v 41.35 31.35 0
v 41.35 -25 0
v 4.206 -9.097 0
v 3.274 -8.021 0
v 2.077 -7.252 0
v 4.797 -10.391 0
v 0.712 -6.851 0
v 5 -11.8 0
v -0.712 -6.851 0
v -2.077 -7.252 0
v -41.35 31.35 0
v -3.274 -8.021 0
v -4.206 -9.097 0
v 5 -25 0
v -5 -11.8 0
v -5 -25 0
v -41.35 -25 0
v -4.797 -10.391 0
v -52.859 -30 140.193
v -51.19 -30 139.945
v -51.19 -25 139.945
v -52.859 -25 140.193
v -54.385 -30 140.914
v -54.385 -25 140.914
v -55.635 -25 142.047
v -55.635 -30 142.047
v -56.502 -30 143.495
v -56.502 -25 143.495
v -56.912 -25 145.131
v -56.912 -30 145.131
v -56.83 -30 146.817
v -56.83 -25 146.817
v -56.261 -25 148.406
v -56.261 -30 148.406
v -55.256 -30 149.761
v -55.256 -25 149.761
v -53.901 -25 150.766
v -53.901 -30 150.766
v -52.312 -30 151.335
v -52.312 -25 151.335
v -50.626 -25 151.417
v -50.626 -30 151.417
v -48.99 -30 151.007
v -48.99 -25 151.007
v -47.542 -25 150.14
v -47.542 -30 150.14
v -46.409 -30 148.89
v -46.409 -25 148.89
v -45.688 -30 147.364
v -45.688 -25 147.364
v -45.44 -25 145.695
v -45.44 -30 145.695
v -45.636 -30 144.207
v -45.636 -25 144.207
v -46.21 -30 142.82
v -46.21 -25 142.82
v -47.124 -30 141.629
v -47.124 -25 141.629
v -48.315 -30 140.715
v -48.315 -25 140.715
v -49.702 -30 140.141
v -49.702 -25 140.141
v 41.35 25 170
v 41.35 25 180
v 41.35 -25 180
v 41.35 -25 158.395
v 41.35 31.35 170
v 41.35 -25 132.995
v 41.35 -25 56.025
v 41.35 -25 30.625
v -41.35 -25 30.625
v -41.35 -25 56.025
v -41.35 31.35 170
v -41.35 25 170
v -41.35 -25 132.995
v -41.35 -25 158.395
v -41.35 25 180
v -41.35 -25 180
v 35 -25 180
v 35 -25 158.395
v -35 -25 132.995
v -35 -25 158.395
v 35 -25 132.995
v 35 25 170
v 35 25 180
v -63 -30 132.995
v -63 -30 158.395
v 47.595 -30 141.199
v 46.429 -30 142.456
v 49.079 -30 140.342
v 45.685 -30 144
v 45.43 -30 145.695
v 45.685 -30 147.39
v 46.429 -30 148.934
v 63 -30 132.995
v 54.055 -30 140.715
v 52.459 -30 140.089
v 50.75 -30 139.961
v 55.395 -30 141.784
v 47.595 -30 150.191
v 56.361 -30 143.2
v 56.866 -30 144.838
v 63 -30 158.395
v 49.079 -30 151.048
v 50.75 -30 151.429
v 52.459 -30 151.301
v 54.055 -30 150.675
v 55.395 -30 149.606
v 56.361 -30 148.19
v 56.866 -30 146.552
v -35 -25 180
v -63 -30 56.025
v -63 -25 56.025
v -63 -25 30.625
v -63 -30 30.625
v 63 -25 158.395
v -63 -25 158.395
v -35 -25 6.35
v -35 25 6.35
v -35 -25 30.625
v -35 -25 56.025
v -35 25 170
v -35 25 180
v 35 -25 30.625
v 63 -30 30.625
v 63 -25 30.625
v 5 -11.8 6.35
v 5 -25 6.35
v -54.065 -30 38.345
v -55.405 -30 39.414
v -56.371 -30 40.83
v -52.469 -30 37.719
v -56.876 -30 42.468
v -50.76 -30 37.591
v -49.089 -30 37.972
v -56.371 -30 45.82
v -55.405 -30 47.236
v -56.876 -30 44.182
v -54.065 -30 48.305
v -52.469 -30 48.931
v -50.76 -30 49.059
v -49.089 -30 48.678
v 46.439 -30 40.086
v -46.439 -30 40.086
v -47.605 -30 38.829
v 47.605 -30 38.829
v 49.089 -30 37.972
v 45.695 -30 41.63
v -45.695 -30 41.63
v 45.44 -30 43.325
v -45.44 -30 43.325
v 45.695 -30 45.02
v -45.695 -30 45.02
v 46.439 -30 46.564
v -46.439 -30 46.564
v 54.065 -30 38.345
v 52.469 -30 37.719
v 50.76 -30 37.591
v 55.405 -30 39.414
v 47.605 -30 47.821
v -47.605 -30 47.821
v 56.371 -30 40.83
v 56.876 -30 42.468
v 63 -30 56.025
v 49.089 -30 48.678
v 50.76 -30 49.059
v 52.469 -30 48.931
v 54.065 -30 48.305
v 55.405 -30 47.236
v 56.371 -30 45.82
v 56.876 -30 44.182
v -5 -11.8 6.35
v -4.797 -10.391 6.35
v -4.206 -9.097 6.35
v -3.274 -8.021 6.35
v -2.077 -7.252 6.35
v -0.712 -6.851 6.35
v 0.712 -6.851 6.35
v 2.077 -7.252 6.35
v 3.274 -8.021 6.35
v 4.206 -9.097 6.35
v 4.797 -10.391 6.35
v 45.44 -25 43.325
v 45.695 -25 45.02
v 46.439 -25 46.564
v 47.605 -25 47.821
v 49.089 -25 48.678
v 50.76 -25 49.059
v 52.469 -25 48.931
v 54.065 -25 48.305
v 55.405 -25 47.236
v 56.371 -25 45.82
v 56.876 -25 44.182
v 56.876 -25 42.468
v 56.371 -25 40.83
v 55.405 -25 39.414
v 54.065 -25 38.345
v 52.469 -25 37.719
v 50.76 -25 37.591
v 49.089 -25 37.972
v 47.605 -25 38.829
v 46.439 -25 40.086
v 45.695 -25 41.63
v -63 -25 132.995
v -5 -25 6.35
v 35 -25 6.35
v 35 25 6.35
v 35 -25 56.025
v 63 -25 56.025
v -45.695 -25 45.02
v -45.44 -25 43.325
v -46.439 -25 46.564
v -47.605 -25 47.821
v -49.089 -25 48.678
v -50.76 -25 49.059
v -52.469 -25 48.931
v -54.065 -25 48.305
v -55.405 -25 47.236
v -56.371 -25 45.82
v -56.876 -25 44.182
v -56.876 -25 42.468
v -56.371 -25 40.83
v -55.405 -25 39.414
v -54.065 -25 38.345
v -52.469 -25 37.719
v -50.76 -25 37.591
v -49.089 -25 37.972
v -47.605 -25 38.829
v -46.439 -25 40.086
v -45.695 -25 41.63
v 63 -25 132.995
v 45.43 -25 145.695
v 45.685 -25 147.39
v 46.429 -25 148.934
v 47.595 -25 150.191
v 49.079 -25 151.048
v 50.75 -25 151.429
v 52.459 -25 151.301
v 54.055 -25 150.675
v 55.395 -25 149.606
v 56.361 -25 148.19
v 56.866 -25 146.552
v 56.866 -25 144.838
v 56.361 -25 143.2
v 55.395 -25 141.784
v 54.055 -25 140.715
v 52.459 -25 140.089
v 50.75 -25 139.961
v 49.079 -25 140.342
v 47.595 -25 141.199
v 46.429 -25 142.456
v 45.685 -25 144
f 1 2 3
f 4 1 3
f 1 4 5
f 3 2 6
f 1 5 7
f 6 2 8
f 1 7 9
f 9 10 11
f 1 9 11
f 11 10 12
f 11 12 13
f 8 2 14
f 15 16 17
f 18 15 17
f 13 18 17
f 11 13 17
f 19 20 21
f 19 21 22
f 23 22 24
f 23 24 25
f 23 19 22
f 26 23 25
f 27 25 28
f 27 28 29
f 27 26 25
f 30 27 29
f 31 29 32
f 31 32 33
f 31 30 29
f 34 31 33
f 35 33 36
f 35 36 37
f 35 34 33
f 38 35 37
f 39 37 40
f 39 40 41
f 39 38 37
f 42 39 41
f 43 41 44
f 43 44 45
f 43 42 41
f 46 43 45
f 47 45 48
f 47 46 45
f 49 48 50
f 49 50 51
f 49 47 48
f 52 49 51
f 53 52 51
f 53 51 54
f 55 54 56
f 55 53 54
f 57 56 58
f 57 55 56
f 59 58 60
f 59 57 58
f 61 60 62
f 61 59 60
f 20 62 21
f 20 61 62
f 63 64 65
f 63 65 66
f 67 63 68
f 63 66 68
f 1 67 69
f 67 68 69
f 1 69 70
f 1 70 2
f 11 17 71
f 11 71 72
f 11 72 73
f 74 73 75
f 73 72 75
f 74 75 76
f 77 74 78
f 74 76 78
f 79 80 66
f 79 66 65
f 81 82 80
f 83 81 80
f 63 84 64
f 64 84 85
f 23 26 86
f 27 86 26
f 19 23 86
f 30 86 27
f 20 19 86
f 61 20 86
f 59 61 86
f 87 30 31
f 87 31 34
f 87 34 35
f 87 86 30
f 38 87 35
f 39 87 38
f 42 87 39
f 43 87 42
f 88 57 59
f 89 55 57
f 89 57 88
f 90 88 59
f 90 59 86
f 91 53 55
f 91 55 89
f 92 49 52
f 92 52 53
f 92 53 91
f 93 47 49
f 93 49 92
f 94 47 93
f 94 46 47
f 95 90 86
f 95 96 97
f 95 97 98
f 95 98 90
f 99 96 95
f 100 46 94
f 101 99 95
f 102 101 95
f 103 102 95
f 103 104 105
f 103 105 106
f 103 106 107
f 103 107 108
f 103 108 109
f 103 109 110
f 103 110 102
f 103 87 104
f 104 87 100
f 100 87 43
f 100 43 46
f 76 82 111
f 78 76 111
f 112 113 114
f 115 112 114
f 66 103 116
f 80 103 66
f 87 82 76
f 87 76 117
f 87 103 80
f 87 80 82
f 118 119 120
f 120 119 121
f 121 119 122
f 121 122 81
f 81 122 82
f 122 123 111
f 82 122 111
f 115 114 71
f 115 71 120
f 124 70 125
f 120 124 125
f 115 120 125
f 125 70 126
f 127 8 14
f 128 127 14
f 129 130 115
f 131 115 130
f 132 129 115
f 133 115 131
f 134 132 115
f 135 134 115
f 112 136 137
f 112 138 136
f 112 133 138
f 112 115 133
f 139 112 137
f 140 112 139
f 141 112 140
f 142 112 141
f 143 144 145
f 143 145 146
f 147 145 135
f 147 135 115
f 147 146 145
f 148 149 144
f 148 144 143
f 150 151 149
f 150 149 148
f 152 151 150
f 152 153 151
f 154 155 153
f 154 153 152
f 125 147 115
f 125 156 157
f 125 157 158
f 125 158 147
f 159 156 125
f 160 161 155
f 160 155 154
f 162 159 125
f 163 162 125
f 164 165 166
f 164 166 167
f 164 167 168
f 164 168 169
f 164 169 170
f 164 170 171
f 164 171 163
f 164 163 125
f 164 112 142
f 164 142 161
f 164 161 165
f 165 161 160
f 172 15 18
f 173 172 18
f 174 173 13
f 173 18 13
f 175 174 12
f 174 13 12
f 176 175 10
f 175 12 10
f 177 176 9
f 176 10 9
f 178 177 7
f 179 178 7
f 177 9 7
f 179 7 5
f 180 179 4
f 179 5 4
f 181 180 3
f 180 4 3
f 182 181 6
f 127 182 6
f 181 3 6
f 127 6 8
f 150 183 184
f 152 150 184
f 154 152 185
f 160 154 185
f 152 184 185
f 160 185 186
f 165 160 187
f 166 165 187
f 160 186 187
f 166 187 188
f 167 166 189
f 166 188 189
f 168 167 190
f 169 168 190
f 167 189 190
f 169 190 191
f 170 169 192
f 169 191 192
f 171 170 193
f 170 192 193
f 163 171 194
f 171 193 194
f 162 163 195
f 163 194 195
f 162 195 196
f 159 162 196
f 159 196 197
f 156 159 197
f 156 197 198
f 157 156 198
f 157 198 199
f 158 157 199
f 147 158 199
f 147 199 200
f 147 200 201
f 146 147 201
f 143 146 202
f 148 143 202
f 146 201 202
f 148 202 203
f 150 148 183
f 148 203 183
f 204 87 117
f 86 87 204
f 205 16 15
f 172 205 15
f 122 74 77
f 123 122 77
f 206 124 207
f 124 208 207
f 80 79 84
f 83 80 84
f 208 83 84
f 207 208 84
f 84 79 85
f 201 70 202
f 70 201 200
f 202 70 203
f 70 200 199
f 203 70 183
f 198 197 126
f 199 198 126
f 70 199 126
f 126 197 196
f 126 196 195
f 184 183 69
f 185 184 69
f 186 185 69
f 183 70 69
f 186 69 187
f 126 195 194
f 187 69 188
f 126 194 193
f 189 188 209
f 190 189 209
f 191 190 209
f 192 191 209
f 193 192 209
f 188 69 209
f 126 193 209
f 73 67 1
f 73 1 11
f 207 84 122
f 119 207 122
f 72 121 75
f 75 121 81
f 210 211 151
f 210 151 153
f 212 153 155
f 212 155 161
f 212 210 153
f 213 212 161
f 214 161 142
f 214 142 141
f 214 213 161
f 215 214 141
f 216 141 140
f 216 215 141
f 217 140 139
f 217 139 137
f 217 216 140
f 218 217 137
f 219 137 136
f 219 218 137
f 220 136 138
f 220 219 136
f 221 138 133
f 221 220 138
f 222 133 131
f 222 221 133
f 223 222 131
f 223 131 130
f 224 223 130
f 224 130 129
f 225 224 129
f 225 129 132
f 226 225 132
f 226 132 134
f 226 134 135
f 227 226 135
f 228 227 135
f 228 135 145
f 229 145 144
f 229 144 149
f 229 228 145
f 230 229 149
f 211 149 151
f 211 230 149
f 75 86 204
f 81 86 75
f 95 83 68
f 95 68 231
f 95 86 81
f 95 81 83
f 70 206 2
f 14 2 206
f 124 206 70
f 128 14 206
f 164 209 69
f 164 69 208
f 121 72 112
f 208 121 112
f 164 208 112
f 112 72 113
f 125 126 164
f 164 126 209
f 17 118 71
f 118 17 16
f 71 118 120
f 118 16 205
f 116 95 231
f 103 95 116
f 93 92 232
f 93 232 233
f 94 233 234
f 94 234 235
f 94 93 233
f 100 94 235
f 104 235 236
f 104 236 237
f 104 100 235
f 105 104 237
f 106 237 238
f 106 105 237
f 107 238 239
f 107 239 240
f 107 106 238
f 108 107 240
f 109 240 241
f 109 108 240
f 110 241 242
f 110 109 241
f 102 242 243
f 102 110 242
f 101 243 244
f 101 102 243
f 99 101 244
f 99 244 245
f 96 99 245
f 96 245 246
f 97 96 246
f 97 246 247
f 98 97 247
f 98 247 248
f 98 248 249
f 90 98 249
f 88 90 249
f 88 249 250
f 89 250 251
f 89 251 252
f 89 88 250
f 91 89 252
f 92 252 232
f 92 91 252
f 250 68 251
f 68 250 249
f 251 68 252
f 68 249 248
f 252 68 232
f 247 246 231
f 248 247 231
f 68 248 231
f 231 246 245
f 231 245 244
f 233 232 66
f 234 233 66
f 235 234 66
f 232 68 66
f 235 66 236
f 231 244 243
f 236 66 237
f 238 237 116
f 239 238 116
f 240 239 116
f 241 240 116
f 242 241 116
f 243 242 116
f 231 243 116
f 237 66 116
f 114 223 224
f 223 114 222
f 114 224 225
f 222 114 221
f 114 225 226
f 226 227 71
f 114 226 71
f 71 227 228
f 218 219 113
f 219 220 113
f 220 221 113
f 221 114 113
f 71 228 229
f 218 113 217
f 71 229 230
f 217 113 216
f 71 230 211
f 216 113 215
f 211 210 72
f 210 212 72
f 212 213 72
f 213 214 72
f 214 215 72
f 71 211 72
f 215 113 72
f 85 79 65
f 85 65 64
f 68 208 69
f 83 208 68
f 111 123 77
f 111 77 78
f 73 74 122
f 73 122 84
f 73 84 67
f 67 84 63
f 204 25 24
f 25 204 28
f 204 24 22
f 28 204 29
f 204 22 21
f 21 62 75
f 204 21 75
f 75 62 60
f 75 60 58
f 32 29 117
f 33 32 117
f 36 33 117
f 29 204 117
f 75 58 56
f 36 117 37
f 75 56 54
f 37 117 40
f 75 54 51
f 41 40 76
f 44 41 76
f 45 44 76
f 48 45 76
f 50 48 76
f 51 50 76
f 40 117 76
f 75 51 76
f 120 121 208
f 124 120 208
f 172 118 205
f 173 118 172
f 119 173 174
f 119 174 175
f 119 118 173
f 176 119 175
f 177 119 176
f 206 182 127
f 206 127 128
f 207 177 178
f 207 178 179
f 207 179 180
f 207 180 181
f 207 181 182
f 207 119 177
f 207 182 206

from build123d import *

# Parameters (mm, degrees)
F1_DEPTH  = 6.35
F2_W      = 50
F2_H      = 180
F3_DEPTH  = 6.35
F4_W      = 50
F4_H      = 180
F5_DEPTH  = 6.35
F6_W      = 70
F6_H      = 163.65
F7_DEPTH  = 6.35
F8_R      = 5.75
F8_W      = 6.35
F8_H      = 12.7
F8_W_2    = 30
F9_DEPTH  = 5
F11_DEPTH = 5


# Not quite as in the source:
# - a feature names something its author has since deleted; it is built from what else it names


with BuildPart() as f1:
    # F0 (on Top) → F1 (new body)
    with BuildSketch(Plane.XY):
        with BuildLine():
            Line((35, -25), (35, 25))
            Line((35, 25), (-35, 25))
            Line((-35, 25), (-35, -25))
            Line((-35, -25), (-5, -25))
            Line((-5, -25), (-5, -11.8))
            ThreePointArc((-5, -11.8), (0, -6.8), (5, -11.8))
            Line((5, -11.8), (5, -25))
            Line((5, -25), (35, -25))
        make_face()
    extrude(amount=F1_DEPTH)

    # F2 (on face) → F3 (join)
    with BuildSketch(Plane(origin=(-35, 0, 0), x_dir=(0, -1, 0), z_dir=(-1, 0, 0))):
        with Locations((0, 90)):
            Rectangle(F2_W, F2_H)
    extrude(amount=F3_DEPTH)

    # F4 (on face) → F5 (join)
    with BuildSketch(Plane.YZ.offset(35)):
        with Locations((0, 90)):
            Rectangle(F4_W, F4_H)
    extrude(amount=F5_DEPTH)

    # F6 (on face) → F7 (join)
    with BuildSketch(Plane(origin=(0, 25, 0), x_dir=(-1, 0, 0), z_dir=(0, 1, 0))):
        with Locations((0, 88.175)):
            Rectangle(F6_W, F6_H)
        Polygon((-41.35, 0), (41.35, 0), (41.35, 170), (35, 170), (35, 6.35), (-35, 6.35), (-35, 170), (-41.35, 170), align=None)
    extrude(amount=F7_DEPTH)

    # F8 (on face) → F9 (join)
    with BuildSketch(Plane.XZ.offset(25)):
        Polygon((-63, 30.625), (-5, 30.625), (-5, 43.325), (-5, 56.025), (-63, 56.025), align=None)
        with Locations((-51.19, 43.325)):
            Circle(F8_R, mode=Mode.SUBTRACT)
        Polygon((-5, 30.625), (5, 30.625), (5, 43.325), (5, 56.025), (-5, 56.025), (-5, 43.325), align=None)
        Polygon((41.35, 43.325), (41.35, 30.625), (63, 30.625), (63, 56.025), (41.35, 56.025), align=None)
        with BuildLine():
            ThreePointArc((56.94, 43.325), (51.19, 37.575), (45.44, 43.325))
            ThreePointArc((45.44, 43.325), (51.19, 49.075), (56.94, 43.325))
        make_face(mode=Mode.SUBTRACT)
        with Locations((38.175, 49.675)):
            Rectangle(F8_W, F8_H)
        with Locations((38.175, 36.975)):
            Rectangle(F8_W, F8_H)
        with Locations((20, 36.975)):
            Rectangle(F8_W_2, F8_H)
        with Locations((20, 49.675)):
            Rectangle(F8_W_2, F8_H)
    extrude(amount=F9_DEPTH)

    # F10 (on face) → F11 (join)
    with BuildSketch(Plane.XZ.offset(30)):
        Polygon((-63, 132.995), (-51.19, 132.995), (63, 132.995), (63, 158.395), (-63, 158.395), align=None)
        with BuildLine():
            ThreePointArc((-45.44, 145.695), (-47.1241360082, 141.6291360082), (-51.19, 139.945))
            ThreePointArc((-51.19, 139.945), (-55.2558639918, 149.7608639918), (-45.44, 145.695))
        make_face(mode=Mode.SUBTRACT)
        with BuildLine():
            ThreePointArc((56.93, 145.695), (51.18, 139.945), (45.43, 145.695))
            ThreePointArc((45.43, 145.695), (51.18, 151.445), (56.93, 145.695))
        make_face(mode=Mode.SUBTRACT)
    extrude(amount=-F11_DEPTH)


solid = f1.part
